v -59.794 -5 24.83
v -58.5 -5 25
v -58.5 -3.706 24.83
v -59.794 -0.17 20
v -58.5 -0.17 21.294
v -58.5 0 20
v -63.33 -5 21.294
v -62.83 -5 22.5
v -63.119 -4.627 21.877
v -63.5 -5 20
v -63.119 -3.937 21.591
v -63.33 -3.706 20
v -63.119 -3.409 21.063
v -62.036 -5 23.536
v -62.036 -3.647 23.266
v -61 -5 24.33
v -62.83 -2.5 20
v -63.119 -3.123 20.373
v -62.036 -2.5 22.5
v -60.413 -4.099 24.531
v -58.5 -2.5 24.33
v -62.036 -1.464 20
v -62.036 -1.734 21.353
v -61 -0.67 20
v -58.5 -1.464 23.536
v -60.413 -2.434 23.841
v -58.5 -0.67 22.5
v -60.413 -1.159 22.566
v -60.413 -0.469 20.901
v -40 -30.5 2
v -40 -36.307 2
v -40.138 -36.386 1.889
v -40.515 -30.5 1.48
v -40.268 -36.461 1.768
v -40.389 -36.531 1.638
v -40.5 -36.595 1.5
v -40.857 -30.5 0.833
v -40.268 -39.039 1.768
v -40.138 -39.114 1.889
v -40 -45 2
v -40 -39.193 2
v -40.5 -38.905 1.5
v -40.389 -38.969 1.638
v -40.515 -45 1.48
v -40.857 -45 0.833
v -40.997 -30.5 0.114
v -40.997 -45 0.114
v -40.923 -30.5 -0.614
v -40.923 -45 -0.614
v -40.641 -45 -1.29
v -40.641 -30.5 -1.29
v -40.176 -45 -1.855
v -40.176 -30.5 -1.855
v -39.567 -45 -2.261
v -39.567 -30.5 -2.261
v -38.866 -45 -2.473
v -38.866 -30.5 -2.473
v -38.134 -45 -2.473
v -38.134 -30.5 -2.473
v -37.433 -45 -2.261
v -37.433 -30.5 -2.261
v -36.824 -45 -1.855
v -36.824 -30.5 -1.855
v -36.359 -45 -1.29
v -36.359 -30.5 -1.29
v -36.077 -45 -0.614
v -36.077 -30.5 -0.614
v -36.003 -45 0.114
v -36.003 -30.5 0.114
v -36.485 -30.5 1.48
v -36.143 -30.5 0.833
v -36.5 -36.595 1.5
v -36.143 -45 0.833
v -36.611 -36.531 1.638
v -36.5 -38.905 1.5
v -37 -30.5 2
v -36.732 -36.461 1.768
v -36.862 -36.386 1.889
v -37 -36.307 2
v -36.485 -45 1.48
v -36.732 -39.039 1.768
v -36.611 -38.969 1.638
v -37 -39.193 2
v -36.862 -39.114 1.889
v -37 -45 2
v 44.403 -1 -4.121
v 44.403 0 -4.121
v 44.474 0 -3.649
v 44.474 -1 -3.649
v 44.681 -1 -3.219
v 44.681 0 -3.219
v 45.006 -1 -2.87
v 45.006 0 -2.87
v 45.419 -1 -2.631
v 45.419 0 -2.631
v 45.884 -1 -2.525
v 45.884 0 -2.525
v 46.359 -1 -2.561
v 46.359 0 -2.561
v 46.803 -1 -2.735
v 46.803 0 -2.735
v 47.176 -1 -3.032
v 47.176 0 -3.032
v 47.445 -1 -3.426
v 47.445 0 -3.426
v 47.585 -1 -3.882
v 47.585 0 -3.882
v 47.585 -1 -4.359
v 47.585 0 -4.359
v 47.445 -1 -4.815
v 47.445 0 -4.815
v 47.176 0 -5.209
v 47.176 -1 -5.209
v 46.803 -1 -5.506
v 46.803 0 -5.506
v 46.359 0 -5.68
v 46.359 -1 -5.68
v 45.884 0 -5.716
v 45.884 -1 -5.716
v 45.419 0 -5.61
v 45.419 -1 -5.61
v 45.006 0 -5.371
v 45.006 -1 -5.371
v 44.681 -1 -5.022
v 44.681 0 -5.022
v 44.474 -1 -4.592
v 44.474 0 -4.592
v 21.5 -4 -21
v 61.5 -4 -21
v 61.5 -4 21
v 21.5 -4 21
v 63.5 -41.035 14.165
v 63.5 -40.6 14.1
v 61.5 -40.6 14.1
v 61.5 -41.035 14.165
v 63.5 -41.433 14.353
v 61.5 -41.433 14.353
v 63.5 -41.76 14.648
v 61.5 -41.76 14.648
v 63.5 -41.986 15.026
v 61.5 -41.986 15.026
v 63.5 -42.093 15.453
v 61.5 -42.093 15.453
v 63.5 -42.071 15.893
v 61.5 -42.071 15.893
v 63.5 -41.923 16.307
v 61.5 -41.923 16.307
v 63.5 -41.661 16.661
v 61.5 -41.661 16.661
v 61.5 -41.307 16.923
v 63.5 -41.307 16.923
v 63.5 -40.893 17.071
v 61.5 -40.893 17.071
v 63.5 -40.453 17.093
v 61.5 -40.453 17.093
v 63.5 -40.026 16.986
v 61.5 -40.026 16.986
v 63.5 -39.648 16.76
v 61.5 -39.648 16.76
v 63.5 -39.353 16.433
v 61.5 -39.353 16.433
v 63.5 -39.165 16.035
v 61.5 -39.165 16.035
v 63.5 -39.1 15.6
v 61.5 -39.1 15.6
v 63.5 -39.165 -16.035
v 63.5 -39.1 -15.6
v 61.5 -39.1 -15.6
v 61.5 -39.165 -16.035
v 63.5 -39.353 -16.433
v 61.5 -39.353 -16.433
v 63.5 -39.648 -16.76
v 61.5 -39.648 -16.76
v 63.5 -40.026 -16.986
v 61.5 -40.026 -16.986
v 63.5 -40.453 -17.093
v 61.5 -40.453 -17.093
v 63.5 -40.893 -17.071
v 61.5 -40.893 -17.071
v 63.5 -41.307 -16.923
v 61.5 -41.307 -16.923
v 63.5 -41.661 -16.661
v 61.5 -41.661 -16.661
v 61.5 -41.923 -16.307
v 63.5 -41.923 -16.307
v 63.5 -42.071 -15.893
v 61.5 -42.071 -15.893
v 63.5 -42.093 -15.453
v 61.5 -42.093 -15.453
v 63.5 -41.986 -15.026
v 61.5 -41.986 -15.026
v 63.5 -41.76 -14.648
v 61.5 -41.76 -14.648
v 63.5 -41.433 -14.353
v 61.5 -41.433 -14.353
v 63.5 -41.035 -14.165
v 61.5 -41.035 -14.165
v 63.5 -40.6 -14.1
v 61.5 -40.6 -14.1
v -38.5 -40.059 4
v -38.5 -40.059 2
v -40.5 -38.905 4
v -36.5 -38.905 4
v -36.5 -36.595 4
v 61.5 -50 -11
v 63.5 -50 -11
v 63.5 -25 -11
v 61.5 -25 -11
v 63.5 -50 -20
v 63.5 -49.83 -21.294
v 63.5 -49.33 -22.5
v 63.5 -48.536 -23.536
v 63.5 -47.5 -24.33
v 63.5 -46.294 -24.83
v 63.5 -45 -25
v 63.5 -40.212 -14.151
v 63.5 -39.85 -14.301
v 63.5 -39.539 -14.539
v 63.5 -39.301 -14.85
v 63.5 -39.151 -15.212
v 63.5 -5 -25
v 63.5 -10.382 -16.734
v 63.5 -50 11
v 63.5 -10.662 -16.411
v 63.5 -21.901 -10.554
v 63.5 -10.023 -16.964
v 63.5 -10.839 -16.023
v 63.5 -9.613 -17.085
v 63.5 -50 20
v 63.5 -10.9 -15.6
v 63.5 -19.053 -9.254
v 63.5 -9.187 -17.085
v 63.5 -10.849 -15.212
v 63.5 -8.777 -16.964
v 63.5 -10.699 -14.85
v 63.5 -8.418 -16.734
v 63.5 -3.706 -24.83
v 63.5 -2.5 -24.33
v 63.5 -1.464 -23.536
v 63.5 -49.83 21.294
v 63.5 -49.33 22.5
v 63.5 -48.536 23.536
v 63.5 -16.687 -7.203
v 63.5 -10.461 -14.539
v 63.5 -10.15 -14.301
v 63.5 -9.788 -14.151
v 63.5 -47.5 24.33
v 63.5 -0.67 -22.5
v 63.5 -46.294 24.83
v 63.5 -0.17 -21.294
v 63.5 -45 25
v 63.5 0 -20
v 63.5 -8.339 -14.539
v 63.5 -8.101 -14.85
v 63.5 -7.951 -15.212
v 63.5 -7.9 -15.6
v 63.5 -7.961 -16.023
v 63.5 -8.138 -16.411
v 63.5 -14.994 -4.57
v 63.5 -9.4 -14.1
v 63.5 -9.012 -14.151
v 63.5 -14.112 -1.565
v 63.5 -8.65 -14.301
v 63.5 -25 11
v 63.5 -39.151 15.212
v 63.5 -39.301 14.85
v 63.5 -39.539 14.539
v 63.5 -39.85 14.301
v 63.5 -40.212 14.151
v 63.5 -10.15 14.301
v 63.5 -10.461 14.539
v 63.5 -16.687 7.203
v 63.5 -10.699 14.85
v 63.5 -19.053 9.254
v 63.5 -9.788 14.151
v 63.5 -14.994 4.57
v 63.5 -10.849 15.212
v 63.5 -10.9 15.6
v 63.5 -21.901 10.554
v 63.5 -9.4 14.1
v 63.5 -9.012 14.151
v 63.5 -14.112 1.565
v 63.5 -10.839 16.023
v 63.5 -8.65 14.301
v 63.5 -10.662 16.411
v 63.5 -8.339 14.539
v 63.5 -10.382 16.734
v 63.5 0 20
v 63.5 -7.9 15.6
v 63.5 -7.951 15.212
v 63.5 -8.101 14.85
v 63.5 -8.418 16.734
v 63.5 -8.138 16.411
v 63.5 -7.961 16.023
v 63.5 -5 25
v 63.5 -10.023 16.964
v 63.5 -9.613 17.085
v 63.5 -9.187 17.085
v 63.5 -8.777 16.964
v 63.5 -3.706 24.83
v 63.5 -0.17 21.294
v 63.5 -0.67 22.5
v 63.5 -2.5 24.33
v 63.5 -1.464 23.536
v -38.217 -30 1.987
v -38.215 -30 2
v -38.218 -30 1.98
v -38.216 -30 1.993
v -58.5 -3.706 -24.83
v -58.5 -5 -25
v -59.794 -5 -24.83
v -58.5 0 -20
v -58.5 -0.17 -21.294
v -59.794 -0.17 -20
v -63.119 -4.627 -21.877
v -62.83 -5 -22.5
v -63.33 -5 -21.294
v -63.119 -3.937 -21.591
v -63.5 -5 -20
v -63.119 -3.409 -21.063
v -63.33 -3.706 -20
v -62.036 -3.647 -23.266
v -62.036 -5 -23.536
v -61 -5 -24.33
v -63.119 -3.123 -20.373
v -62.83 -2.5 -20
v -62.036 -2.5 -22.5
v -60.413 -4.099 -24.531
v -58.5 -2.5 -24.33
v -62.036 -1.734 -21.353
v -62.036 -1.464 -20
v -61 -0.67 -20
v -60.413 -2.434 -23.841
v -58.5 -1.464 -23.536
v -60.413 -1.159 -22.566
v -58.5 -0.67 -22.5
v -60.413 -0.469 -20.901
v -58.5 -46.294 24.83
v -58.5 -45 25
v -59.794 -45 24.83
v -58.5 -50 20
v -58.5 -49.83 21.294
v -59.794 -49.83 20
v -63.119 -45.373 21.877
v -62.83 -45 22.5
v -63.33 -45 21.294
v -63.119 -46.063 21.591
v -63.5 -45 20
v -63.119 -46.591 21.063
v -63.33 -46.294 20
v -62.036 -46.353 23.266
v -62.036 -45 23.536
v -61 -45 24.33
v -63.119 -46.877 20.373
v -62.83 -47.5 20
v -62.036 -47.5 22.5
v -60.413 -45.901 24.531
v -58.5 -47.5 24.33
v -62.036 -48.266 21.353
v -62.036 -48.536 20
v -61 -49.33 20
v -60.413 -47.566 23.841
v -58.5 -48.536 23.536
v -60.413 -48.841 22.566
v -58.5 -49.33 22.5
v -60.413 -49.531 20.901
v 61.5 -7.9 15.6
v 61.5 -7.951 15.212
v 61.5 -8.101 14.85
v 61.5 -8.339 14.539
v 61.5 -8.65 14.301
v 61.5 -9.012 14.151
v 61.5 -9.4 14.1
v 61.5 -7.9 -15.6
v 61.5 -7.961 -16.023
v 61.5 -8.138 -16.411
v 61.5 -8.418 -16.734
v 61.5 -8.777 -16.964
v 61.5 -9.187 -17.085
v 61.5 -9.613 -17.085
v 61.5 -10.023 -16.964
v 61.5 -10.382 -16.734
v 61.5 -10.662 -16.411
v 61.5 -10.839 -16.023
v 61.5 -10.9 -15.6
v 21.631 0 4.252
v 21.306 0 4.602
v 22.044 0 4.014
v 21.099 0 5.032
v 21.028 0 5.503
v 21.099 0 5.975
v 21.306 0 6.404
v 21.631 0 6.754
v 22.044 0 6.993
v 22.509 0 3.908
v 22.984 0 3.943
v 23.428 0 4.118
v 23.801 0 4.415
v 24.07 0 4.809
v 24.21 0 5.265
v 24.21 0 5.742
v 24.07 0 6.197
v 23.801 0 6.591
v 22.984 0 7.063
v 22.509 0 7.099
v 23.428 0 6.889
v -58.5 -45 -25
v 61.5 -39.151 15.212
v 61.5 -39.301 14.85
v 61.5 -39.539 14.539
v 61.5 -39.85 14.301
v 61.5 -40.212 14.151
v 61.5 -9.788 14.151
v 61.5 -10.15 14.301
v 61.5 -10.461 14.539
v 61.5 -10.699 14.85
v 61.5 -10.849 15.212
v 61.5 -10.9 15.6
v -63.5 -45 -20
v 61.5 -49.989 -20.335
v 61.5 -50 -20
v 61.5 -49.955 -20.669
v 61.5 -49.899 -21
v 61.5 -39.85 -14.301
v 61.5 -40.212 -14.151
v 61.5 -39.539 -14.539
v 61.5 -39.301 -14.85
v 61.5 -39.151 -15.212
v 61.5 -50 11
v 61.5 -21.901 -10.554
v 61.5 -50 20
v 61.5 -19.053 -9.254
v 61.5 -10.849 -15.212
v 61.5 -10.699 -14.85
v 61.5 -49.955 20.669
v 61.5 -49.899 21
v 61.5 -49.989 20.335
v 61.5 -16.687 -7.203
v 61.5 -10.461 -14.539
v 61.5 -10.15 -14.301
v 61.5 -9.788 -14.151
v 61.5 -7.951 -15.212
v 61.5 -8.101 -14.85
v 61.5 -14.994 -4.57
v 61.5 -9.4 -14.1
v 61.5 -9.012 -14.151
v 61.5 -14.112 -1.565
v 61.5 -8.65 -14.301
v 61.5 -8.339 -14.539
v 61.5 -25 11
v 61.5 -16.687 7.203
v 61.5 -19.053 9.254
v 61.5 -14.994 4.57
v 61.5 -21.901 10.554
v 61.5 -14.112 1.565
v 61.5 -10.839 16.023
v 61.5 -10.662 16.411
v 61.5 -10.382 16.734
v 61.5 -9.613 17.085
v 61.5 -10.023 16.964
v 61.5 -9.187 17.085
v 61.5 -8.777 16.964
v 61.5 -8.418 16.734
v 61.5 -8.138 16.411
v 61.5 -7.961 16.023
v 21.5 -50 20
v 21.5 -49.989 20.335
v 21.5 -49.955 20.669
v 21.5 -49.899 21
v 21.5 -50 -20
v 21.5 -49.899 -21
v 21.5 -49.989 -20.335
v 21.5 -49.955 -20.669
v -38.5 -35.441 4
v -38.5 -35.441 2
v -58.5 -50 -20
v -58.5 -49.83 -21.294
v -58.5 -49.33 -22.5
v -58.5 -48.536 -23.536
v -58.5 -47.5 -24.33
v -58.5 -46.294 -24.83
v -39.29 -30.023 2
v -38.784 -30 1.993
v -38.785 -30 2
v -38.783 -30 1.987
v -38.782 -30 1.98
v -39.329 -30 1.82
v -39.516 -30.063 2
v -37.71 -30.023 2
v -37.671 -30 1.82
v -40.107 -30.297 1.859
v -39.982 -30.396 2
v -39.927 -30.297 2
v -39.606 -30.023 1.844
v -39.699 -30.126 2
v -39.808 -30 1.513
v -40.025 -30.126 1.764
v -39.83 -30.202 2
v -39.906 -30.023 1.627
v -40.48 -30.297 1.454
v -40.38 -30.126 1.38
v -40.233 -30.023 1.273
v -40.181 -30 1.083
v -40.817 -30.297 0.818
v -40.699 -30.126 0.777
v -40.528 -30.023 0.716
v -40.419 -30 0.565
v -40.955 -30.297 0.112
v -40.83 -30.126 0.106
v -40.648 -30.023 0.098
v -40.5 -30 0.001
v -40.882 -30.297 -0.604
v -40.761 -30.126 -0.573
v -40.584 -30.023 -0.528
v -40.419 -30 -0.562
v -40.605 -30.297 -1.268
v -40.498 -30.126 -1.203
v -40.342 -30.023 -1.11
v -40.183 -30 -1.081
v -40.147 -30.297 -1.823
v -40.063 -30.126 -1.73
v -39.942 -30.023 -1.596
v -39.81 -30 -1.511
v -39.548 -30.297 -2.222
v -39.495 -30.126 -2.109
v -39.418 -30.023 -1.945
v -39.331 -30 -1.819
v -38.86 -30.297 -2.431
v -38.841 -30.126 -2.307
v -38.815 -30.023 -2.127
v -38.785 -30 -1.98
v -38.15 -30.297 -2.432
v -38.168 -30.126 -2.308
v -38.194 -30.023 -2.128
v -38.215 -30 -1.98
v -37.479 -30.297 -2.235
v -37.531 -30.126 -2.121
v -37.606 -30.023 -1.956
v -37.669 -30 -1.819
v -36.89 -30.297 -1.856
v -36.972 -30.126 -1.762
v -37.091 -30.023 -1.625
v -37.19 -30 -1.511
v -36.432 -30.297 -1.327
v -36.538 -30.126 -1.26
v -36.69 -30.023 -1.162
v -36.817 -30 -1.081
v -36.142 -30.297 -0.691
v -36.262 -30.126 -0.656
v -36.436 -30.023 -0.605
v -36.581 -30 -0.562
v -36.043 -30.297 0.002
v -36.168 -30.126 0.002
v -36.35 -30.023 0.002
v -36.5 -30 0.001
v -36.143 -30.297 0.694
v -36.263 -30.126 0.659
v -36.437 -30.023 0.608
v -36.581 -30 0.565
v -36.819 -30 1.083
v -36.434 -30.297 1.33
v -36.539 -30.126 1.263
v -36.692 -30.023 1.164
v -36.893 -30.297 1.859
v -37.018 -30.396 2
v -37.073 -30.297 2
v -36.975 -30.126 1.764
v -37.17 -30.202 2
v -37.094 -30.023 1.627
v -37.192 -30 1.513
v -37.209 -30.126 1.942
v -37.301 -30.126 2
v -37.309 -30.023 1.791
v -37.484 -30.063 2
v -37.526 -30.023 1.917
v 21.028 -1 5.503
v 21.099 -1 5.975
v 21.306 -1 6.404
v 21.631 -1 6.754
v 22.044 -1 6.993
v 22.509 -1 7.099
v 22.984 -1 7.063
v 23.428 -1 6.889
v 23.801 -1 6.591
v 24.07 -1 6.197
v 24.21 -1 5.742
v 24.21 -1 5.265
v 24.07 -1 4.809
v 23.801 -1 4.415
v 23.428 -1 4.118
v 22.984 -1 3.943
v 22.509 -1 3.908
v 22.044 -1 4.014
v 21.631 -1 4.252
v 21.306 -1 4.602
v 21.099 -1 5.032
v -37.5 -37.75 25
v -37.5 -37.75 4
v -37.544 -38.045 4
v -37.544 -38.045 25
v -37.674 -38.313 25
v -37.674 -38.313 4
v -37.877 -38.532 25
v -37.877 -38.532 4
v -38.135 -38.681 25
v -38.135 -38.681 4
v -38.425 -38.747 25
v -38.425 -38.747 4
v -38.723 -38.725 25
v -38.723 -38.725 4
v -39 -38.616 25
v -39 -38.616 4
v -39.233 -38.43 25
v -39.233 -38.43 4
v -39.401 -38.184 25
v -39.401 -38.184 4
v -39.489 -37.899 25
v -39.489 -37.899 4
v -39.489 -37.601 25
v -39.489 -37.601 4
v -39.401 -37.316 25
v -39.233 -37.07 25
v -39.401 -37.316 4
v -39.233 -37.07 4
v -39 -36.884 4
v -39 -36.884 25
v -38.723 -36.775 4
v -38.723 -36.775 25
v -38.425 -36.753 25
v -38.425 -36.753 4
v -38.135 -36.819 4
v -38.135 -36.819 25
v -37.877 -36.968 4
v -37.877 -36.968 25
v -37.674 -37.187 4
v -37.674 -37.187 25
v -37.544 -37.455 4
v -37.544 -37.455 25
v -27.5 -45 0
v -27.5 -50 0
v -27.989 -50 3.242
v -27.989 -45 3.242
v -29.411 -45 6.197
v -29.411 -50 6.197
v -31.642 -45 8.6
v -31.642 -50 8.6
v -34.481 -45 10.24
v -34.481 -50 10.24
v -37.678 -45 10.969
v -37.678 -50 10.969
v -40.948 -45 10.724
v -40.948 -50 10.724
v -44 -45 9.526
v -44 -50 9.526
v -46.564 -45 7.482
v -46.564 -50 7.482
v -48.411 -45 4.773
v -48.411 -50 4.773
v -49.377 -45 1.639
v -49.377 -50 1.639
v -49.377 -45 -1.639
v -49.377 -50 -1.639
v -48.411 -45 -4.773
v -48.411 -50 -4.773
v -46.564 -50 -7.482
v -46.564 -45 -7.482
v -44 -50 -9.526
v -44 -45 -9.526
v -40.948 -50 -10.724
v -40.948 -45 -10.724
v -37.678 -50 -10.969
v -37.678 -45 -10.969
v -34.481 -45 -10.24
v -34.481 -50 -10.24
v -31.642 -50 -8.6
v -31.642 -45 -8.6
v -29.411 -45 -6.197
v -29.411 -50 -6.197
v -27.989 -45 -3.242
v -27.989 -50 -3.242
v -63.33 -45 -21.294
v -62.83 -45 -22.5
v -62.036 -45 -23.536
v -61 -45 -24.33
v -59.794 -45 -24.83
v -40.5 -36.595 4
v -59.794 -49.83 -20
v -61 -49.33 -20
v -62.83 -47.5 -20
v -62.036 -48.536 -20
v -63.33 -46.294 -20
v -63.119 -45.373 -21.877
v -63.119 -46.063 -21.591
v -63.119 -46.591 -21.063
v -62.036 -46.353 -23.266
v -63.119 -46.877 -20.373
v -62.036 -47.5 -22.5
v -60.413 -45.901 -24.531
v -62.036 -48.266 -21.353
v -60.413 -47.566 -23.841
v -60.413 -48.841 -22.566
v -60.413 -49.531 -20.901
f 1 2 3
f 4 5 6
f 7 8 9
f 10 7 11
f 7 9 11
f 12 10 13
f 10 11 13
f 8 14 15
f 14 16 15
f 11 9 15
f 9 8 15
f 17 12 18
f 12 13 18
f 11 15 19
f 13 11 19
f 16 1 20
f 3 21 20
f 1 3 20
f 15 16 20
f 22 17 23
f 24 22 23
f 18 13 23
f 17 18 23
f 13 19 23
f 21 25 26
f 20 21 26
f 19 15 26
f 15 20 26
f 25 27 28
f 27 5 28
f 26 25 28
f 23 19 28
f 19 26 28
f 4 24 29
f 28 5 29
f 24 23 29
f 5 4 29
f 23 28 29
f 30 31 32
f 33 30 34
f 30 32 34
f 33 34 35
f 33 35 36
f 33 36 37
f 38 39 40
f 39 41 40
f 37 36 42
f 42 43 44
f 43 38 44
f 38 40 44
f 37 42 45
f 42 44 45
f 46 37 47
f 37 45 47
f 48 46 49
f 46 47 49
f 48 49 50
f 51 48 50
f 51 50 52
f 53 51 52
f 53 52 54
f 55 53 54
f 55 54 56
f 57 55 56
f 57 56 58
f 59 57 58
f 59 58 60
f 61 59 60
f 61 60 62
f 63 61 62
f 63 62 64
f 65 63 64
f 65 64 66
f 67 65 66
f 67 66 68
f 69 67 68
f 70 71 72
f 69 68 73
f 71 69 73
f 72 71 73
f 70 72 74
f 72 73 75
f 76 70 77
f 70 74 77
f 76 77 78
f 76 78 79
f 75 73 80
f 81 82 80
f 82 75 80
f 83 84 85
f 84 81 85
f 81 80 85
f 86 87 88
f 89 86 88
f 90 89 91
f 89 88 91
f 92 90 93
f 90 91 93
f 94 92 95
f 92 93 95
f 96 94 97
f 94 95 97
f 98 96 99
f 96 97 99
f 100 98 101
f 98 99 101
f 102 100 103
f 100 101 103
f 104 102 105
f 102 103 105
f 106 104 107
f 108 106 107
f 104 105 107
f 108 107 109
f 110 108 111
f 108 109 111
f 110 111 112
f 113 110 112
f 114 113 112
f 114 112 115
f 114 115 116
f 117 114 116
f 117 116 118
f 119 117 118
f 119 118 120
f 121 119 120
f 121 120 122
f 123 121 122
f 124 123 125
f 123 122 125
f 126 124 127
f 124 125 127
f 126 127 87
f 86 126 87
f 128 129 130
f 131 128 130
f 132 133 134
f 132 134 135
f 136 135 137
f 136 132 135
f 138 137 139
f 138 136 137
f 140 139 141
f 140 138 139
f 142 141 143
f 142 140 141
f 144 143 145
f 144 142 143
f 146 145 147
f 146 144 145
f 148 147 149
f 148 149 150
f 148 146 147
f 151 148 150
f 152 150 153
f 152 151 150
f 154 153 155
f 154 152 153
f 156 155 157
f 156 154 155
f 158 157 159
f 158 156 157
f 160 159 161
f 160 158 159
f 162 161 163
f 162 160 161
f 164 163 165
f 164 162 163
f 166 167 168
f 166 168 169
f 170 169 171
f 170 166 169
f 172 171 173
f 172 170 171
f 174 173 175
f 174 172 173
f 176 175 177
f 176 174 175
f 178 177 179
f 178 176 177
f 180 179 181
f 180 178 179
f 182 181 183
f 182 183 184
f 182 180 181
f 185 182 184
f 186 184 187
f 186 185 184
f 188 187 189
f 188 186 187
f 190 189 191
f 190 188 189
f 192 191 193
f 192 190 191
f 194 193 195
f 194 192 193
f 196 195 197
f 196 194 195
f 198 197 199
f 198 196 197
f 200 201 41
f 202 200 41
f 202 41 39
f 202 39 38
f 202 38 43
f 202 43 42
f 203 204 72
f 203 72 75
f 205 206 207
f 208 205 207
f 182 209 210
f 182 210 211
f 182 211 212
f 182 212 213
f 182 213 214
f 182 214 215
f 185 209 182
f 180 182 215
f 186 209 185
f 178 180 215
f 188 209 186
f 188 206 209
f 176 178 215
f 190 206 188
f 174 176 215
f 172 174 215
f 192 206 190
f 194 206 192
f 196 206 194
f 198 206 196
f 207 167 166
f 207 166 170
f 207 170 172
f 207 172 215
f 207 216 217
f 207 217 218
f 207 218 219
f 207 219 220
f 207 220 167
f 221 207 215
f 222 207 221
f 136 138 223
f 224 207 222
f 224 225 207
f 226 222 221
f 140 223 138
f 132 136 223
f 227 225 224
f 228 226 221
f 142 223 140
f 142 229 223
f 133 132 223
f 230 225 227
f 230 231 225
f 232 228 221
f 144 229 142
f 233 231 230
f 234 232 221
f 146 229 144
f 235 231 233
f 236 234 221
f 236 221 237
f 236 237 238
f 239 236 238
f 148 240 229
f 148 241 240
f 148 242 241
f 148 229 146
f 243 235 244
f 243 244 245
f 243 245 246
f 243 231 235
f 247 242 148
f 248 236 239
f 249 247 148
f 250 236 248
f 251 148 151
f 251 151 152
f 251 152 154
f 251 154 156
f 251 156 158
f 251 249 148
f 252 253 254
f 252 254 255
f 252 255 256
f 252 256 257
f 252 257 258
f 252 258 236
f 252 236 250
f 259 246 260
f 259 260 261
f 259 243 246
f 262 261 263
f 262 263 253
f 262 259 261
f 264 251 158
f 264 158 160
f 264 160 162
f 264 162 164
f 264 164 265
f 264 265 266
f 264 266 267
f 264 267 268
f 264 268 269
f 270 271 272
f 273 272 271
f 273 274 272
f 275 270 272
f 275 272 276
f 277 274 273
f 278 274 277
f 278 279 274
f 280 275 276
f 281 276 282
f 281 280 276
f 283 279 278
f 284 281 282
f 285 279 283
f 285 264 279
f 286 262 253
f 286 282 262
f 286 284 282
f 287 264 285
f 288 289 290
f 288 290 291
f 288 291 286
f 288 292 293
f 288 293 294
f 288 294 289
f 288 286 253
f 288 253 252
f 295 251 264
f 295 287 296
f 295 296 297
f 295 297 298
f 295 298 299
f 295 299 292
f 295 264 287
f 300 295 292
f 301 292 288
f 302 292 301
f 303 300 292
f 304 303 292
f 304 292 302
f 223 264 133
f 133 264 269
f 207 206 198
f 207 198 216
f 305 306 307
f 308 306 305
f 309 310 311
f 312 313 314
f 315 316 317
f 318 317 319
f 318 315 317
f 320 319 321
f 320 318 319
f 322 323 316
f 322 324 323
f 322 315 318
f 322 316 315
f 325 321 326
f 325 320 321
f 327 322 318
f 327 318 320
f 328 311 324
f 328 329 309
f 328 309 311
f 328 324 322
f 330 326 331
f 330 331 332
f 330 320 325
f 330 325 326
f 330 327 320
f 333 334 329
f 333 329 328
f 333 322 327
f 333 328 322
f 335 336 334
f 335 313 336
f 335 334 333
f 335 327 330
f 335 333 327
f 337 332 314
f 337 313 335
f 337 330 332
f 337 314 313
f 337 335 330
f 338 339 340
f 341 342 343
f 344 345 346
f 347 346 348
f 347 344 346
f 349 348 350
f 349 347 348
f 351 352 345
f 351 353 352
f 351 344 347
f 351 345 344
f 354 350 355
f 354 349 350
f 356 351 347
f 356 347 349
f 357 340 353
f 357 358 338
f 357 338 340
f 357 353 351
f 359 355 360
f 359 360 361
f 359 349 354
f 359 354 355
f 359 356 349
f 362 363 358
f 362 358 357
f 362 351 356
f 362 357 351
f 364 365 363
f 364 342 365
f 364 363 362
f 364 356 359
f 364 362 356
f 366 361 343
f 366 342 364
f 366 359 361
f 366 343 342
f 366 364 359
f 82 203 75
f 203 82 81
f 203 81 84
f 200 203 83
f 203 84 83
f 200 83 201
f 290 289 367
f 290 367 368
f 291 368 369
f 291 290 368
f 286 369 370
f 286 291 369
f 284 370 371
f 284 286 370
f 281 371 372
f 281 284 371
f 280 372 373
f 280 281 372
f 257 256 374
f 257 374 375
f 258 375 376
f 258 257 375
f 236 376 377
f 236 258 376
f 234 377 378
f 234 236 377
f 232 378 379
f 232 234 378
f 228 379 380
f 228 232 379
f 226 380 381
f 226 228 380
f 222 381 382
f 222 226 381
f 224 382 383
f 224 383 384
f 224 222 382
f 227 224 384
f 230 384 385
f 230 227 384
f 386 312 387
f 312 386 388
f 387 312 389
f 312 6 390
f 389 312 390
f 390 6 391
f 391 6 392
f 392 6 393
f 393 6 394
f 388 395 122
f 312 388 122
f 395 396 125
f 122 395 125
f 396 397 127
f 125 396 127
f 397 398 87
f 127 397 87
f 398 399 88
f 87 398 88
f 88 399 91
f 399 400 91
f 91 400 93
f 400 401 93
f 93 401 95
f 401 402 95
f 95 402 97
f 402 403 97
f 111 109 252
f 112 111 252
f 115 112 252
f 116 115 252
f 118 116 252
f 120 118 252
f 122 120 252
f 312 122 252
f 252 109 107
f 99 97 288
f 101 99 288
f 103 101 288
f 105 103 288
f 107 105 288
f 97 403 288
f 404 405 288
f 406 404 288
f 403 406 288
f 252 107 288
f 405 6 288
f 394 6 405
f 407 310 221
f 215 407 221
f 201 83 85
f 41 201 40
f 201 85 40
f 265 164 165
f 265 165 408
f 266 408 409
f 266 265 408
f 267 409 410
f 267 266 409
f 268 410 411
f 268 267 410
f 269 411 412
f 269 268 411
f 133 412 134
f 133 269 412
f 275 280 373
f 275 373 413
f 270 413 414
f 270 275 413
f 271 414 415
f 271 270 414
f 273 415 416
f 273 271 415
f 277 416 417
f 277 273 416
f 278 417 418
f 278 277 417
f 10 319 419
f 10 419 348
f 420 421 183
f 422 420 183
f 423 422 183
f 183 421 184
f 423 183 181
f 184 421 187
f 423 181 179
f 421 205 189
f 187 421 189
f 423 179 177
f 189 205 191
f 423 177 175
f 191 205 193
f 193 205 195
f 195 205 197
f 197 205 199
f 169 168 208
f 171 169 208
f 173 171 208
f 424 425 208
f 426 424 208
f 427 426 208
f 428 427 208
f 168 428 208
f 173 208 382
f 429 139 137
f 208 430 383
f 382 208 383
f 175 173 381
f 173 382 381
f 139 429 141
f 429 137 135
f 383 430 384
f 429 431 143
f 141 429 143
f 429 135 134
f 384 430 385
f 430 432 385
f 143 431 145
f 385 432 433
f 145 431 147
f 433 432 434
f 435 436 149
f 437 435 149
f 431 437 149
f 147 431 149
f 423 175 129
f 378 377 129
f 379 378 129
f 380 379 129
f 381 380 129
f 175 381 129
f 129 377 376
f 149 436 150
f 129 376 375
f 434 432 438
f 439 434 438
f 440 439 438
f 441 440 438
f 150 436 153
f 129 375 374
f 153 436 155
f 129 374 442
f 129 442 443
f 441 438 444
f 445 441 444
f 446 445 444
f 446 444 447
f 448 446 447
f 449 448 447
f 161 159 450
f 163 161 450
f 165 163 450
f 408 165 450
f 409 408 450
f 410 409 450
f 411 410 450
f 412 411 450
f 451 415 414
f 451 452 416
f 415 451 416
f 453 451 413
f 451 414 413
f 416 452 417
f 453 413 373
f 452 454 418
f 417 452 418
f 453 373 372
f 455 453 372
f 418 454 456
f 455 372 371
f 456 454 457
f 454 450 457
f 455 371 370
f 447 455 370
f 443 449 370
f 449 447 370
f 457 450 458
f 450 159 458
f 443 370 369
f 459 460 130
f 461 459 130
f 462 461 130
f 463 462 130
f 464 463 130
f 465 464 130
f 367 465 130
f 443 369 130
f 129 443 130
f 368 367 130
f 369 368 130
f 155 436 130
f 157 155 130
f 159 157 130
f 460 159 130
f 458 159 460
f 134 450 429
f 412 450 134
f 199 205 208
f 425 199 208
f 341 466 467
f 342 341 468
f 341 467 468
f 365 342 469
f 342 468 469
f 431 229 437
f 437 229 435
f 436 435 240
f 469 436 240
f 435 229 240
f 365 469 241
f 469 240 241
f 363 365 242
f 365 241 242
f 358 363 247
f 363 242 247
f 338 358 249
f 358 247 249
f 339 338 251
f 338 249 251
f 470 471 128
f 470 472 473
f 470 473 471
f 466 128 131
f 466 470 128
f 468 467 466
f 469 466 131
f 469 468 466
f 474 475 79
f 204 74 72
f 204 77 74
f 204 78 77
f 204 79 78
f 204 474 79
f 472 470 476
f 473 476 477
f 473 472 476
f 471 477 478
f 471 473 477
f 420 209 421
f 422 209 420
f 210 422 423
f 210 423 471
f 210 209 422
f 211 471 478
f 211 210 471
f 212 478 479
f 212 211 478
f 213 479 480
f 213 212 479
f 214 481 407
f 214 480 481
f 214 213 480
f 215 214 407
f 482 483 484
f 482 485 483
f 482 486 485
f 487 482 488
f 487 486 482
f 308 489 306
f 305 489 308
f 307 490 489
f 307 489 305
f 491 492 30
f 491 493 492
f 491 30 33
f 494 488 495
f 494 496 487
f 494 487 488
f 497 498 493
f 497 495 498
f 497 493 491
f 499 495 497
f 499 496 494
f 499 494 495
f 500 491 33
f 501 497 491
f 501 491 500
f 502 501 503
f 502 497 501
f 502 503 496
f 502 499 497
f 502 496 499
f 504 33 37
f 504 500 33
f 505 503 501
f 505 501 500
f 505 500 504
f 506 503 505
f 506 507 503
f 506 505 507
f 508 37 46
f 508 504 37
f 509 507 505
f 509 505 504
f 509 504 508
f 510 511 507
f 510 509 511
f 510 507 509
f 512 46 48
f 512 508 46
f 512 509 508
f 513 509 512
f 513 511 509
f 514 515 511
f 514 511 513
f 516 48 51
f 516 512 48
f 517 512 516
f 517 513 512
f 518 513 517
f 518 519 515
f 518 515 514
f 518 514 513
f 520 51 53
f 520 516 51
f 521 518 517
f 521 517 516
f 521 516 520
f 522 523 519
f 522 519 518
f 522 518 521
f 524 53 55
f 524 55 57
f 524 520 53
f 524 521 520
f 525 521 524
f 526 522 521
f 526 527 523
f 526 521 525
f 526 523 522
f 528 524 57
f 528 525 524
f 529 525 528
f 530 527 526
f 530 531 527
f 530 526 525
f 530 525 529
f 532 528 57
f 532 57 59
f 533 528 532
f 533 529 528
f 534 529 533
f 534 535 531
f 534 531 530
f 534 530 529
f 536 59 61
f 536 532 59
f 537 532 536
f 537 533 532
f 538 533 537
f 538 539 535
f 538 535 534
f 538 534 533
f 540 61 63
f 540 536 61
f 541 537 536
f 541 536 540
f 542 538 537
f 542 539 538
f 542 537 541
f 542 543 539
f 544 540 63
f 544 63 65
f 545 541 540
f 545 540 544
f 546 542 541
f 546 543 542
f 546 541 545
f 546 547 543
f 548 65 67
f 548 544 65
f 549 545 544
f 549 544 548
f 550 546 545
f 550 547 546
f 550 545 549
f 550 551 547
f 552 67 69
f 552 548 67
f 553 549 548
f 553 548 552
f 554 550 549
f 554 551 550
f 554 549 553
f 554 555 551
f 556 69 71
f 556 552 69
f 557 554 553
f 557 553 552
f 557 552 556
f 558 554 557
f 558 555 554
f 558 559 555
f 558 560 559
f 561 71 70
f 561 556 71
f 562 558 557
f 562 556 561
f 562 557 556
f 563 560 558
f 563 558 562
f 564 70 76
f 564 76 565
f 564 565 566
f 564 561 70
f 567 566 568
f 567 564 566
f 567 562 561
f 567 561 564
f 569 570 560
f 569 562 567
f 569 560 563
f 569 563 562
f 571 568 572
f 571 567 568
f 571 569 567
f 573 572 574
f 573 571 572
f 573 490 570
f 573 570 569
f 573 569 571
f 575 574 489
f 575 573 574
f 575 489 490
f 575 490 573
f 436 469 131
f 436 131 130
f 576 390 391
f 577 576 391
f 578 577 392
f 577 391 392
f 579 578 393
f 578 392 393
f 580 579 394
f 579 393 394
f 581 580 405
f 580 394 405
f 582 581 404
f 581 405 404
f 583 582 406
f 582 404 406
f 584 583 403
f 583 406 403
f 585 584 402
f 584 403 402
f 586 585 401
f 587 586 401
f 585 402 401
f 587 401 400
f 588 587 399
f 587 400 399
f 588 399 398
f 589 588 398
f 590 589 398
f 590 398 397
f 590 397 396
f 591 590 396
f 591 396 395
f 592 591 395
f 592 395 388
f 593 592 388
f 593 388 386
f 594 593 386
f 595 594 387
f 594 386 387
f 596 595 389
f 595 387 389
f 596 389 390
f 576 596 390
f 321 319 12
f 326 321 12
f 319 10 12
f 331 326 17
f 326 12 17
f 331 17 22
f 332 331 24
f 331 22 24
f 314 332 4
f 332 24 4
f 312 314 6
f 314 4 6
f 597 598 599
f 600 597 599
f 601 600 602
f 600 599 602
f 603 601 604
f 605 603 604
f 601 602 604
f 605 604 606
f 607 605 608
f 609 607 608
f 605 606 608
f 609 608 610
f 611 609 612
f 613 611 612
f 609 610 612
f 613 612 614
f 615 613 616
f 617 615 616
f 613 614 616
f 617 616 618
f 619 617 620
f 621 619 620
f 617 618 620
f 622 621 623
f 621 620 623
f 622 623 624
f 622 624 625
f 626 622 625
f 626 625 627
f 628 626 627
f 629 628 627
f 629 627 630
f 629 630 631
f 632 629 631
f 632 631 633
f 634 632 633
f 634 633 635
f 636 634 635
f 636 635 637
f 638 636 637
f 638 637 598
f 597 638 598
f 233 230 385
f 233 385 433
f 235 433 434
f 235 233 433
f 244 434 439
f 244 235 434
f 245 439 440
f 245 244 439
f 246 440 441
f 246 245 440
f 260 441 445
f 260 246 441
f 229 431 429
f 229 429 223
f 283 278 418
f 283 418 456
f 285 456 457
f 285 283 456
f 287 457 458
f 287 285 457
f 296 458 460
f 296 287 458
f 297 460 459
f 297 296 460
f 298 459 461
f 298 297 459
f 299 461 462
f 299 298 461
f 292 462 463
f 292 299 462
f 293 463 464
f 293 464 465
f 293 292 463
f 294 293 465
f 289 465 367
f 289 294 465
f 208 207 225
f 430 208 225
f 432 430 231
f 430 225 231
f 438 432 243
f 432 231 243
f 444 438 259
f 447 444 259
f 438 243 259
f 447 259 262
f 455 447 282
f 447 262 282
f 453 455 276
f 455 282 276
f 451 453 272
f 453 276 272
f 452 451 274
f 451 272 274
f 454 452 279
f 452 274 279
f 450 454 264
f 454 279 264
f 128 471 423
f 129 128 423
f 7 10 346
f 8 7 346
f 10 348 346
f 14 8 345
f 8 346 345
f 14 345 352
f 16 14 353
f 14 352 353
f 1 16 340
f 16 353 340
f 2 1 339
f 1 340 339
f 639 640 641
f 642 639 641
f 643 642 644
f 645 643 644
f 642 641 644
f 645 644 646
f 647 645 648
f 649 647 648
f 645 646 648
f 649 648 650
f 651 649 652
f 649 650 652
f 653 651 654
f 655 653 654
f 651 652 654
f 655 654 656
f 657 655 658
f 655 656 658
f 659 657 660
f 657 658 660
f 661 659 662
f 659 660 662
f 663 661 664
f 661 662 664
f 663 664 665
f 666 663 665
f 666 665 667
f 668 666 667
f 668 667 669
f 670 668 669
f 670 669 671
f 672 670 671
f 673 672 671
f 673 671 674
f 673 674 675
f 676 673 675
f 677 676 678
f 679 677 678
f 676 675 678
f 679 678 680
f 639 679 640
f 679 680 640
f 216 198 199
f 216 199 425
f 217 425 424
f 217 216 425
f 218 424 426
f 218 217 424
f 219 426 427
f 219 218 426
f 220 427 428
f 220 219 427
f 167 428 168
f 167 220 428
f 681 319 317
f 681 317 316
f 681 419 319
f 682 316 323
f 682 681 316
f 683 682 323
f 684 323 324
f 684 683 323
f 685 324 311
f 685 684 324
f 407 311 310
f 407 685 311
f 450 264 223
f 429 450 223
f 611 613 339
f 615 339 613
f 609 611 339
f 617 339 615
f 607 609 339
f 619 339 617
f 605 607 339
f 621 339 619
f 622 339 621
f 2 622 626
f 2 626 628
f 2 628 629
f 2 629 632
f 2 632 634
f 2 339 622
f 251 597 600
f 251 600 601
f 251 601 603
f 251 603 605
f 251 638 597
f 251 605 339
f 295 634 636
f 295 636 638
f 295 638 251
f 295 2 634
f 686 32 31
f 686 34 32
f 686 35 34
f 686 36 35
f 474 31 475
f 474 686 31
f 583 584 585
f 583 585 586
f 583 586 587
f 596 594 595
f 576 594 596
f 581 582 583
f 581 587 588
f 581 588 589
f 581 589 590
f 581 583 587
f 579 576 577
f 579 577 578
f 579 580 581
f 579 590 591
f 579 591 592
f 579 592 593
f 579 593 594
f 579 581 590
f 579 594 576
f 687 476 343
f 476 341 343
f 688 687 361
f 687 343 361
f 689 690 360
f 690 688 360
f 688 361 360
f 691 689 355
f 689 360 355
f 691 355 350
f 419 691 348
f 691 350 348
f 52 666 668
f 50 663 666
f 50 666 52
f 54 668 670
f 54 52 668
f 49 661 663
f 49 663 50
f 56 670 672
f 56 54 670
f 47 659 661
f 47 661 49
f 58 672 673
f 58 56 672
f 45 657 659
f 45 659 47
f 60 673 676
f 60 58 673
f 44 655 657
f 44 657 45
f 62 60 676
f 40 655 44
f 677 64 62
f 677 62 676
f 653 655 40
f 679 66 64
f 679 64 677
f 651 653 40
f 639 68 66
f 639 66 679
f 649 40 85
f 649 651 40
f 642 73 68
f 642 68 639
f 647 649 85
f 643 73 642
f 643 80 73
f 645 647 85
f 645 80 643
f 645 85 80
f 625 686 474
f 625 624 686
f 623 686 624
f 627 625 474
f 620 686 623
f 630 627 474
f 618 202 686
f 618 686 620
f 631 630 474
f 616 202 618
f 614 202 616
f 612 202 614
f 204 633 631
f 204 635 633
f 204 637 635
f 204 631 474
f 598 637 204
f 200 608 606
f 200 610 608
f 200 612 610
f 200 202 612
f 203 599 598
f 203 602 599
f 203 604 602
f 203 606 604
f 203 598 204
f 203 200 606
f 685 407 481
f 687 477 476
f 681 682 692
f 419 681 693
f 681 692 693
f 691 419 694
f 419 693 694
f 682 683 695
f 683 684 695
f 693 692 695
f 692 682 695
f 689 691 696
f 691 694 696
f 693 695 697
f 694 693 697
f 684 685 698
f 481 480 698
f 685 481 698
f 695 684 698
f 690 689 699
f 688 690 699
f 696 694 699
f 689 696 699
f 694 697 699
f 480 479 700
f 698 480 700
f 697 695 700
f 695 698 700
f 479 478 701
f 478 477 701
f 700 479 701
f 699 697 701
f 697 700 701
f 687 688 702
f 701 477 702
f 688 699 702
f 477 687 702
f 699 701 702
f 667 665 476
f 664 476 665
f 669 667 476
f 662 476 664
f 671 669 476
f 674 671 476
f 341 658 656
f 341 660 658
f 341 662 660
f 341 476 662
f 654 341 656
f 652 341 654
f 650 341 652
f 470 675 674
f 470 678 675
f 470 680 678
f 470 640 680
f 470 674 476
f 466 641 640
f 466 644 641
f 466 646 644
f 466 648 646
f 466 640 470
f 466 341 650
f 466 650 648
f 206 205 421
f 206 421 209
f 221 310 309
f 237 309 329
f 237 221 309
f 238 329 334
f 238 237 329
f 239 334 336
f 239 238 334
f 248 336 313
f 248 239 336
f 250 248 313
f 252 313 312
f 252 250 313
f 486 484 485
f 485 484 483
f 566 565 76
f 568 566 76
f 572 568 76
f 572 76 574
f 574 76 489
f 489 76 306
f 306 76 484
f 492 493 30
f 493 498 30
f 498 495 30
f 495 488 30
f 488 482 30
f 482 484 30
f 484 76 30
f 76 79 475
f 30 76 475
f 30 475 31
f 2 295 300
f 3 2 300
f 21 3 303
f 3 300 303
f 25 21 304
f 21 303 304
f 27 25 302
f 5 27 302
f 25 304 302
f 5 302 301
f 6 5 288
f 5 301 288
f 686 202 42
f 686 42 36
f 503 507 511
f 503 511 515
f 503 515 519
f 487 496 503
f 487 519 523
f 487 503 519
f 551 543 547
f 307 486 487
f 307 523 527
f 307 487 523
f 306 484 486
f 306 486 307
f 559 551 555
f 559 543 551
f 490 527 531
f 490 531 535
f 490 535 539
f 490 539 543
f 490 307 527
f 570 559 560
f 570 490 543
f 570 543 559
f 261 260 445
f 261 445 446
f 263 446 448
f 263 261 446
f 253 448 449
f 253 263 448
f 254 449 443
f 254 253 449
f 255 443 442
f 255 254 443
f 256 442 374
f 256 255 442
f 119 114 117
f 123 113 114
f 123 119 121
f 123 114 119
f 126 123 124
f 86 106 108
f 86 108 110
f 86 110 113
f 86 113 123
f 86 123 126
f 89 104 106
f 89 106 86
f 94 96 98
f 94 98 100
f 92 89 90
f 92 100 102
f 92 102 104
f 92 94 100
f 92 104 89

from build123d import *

# Parameters (mm, degrees)
F0_W           = 127
F0_H           = 50
F1_DEPTH       = 50
F3_DEPTH       = 42
F4_R           = 11
F5_DEPTH       = 5
F7_DEPTH       = 15
F8_T2_ANGLE    = 343.7894292622
F9_R           = 5
F12_W          = 40
F12_H          = 42
F13_DEPTH      = 46
F14_R          = 1.6
F15_DEPTH      = 1
F16_R          = 1
F17_DEPTH      = 2
F17_DEPTH_BACK = 1.03
F18_DEPTH      = 25
F19_DEPTH      = 2
F20_DEPTH      = 25


# Not quite as in the source:
# - a fillet or chamfer that OpenCascade refuses, or shapes differently, is made with other operations: its cross-section is extruded or revolved along the edge and cut away or added


with BuildPart() as f1:
    # F0 (on Front) → F1 (new body)
    with BuildSketch(Plane.XZ):
        Rectangle(F0_W, F0_H)
    extrude(amount=F1_DEPTH)

    # F2 (on face) → F3 (cut)
    with BuildSketch(Plane.YZ.offset(63.5)):
        Polygon((-41.7573593129, 21), (-46, 16.7573593129), (-46, -16.7573593129), (-41.7573593129, -21), (-8.2426406871, -21), (-4, -16.7573593129), (-4, 16.7573593129), (-8.2426406871, 21), align=None)
    extrude(amount=-F3_DEPTH, mode=Mode.SUBTRACT)

    # F4 (on face) → F5 (cut)
    with BuildSketch(Plane.XZ.offset(50)):
        with Locations((-38.5, 0)):
            Circle(F4_R)
    extrude(amount=-F5_DEPTH, mode=Mode.SUBTRACT)

    # F6 (on face) → F7 (cut)
    with BuildSketch(Plane.XZ.offset(45)):
        with BuildLine():
            Line((-37, 2), (-40, 2))
            ThreePointArc((-40, 2), (-38.5, -2.5), (-37, 2))
        make_face()
    extrude(amount=-F7_DEPTH, mode=Mode.SUBTRACT)

    # F8: fillet of radius 0.5 on 1 edges, made by hand

    # F8_s1 → F8_t2 (revolve)
    with BuildSketch(Plane(origin=(-37.7346622942, 0, -5.3739891953), x_dir=(0, 1, 0), z_dir=(0.9900106558, 0, 0.1409925581))):
        with BuildLine():
            ThreePointArc((-30.5, 7.9282134883), (-30.1464466094, 7.7817668789), (-30, 7.4282134883))
            Line((-30, 7.4282134883), (-30, 7.9282134883))
            Line((-30, 7.9282134883), (-30.5, 7.9282134883))
        make_face()
    revolve(axis=Axis((-38.5, -30, 0), (0, -1, 0)), revolution_arc=F8_T2_ANGLE)

    # F9
    f9_edges = [f1.edges().sort_by_distance(p)[0] for p in [
        (0, -50, 25),
        (0, -50, -25),
        (0, 0, 25),
        (0, 0, -25),
        (-63.5, -25, 25),
        (-63.5, -25, -25),
        (-63.5, 0, 0),
        (-63.5, -50, 0),
    ]]
    fillet(f9_edges, radius=F9_R)

    # F12 (on face) → F13 (cut)
    with BuildSketch(Plane.XZ.offset(50)):
        with Locations((41.5, 0)):
            Rectangle(F12_W, F12_H)
    extrude(amount=-F13_DEPTH, mode=Mode.SUBTRACT)

    # F14 (on face) → F15 (cut)
    with BuildSketch(Plane(origin=(0, 0, 0), x_dir=(-1, 0, 0), z_dir=(0, 1, 0))):
        with Locations((-46.0031795697, -4.1205275279)):
            Circle(F14_R)
        with Locations((-22.6282365388, 5.5031795697)):
            Circle(F14_R)
    extrude(amount=-F15_DEPTH, mode=Mode.SUBTRACT)

    # F16 (on face) → F17 (cut, two sides)
    with BuildSketch(Plane(origin=(0, 0, 2), x_dir=(1, 0, 0), z_dir=(0, 0, -1))) as f17_sk:
        Polygon((-36.5, 38.9047005384), (-38.5, 40.0594010768), (-40.5, 38.9047005384), (-40.5, 36.5952994616), (-38.5, 35.4405989232), (-36.5, 36.5952994616), align=None)
        with Locations((-38.5, 37.75)):
            Circle(F16_R, mode=Mode.SUBTRACT)
    extrude(amount=-F17_DEPTH, mode=Mode.SUBTRACT)
    extrude(f17_sk.sketch, amount=F17_DEPTH_BACK, mode=Mode.SUBTRACT)

    # F18 (cut): a face of the model
    f18_faces = [f1.faces().sort_by_distance(p)[0] for p in [
        (-38.5, -37.75, 2),
    ]]
    extrude(f18_faces, amount=-F18_DEPTH, mode=Mode.SUBTRACT)

    # F10 (on face) → F19 (join)
    with BuildSketch(Plane.YZ.offset(63.5)):
        Polygon((-46, 16.7573593129), (-46, -16.7573593129), (-41.7573593129, -21), (-8.2426406871, -21), (-4, -16.7573593129), (-4, 16.7573593129), (-8.2426406871, 21), (-16.9, 21), (-33.1, 21), (-41.7573593129, 21), align=None)
        with BuildLine():
            Line((-10.9, -15.6), (-39.1, -15.6))
            ThreePointArc((-39.1, -15.6), (-41.6606601718, -16.6606601718), (-40.6, -14.1))
            Line((-40.6, -14.1), (-40.6, 14.1))
            ThreePointArc((-40.6, 14.1), (-41.6606601718, 16.6606601718), (-39.1, 15.6))
            Line((-39.1, 15.6), (-10.9, 15.6))
            ThreePointArc((-10.9, 15.6), (-9.4, 17.1), (-7.9, 15.6))
            ThreePointArc((-7.9, 15.6), (-8.3393398282, 14.5393398282), (-9.4, 14.1))
            Line((-9.4, 14.1), (-9.4, -14.1))
            ThreePointArc((-9.4, -14.1), (-8.3393398282, -14.5393398282), (-7.9, -15.6))
            ThreePointArc((-7.9, -15.6), (-9.4, -17.1), (-10.9, -15.6))
        make_face(mode=Mode.SUBTRACT)
        with BuildLine():
            ThreePointArc((-40.6, -14.1), (-39.5393398282, -14.5393398282), (-39.1, -15.6))
            Line((-39.1, -15.6), (-10.9, -15.6))
            ThreePointArc((-10.9, -15.6), (-10.4606601718, -14.5393398282), (-9.4, -14.1))
            Line((-9.4, -14.1), (-9.4, 14.1))
            ThreePointArc((-9.4, 14.1), (-10.4606601718, 14.5393398282), (-10.9, 15.6))
            Line((-10.9, 15.6), (-39.1, 15.6))
            ThreePointArc((-39.1, 15.6), (-39.5393398282, 14.5393398282), (-40.6, 14.1))
            Line((-40.6, 14.1), (-40.6, -14.1))
        make_face()
    extrude(amount=-F19_DEPTH)

    # F11 (on face) → F20 (cut)
    with BuildSketch(Plane.YZ.offset(63.5)):
        with BuildLine():
            Line((-50, -11), (-25, -11))
            ThreePointArc((-25, -11), (-14, 0), (-25, 11))
            Line((-25, 11), (-50, 11))
            Line((-50, 11), (-50, -11))
        make_face()
    extrude(amount=-F20_DEPTH, mode=Mode.SUBTRACT)


solid = f1.part
